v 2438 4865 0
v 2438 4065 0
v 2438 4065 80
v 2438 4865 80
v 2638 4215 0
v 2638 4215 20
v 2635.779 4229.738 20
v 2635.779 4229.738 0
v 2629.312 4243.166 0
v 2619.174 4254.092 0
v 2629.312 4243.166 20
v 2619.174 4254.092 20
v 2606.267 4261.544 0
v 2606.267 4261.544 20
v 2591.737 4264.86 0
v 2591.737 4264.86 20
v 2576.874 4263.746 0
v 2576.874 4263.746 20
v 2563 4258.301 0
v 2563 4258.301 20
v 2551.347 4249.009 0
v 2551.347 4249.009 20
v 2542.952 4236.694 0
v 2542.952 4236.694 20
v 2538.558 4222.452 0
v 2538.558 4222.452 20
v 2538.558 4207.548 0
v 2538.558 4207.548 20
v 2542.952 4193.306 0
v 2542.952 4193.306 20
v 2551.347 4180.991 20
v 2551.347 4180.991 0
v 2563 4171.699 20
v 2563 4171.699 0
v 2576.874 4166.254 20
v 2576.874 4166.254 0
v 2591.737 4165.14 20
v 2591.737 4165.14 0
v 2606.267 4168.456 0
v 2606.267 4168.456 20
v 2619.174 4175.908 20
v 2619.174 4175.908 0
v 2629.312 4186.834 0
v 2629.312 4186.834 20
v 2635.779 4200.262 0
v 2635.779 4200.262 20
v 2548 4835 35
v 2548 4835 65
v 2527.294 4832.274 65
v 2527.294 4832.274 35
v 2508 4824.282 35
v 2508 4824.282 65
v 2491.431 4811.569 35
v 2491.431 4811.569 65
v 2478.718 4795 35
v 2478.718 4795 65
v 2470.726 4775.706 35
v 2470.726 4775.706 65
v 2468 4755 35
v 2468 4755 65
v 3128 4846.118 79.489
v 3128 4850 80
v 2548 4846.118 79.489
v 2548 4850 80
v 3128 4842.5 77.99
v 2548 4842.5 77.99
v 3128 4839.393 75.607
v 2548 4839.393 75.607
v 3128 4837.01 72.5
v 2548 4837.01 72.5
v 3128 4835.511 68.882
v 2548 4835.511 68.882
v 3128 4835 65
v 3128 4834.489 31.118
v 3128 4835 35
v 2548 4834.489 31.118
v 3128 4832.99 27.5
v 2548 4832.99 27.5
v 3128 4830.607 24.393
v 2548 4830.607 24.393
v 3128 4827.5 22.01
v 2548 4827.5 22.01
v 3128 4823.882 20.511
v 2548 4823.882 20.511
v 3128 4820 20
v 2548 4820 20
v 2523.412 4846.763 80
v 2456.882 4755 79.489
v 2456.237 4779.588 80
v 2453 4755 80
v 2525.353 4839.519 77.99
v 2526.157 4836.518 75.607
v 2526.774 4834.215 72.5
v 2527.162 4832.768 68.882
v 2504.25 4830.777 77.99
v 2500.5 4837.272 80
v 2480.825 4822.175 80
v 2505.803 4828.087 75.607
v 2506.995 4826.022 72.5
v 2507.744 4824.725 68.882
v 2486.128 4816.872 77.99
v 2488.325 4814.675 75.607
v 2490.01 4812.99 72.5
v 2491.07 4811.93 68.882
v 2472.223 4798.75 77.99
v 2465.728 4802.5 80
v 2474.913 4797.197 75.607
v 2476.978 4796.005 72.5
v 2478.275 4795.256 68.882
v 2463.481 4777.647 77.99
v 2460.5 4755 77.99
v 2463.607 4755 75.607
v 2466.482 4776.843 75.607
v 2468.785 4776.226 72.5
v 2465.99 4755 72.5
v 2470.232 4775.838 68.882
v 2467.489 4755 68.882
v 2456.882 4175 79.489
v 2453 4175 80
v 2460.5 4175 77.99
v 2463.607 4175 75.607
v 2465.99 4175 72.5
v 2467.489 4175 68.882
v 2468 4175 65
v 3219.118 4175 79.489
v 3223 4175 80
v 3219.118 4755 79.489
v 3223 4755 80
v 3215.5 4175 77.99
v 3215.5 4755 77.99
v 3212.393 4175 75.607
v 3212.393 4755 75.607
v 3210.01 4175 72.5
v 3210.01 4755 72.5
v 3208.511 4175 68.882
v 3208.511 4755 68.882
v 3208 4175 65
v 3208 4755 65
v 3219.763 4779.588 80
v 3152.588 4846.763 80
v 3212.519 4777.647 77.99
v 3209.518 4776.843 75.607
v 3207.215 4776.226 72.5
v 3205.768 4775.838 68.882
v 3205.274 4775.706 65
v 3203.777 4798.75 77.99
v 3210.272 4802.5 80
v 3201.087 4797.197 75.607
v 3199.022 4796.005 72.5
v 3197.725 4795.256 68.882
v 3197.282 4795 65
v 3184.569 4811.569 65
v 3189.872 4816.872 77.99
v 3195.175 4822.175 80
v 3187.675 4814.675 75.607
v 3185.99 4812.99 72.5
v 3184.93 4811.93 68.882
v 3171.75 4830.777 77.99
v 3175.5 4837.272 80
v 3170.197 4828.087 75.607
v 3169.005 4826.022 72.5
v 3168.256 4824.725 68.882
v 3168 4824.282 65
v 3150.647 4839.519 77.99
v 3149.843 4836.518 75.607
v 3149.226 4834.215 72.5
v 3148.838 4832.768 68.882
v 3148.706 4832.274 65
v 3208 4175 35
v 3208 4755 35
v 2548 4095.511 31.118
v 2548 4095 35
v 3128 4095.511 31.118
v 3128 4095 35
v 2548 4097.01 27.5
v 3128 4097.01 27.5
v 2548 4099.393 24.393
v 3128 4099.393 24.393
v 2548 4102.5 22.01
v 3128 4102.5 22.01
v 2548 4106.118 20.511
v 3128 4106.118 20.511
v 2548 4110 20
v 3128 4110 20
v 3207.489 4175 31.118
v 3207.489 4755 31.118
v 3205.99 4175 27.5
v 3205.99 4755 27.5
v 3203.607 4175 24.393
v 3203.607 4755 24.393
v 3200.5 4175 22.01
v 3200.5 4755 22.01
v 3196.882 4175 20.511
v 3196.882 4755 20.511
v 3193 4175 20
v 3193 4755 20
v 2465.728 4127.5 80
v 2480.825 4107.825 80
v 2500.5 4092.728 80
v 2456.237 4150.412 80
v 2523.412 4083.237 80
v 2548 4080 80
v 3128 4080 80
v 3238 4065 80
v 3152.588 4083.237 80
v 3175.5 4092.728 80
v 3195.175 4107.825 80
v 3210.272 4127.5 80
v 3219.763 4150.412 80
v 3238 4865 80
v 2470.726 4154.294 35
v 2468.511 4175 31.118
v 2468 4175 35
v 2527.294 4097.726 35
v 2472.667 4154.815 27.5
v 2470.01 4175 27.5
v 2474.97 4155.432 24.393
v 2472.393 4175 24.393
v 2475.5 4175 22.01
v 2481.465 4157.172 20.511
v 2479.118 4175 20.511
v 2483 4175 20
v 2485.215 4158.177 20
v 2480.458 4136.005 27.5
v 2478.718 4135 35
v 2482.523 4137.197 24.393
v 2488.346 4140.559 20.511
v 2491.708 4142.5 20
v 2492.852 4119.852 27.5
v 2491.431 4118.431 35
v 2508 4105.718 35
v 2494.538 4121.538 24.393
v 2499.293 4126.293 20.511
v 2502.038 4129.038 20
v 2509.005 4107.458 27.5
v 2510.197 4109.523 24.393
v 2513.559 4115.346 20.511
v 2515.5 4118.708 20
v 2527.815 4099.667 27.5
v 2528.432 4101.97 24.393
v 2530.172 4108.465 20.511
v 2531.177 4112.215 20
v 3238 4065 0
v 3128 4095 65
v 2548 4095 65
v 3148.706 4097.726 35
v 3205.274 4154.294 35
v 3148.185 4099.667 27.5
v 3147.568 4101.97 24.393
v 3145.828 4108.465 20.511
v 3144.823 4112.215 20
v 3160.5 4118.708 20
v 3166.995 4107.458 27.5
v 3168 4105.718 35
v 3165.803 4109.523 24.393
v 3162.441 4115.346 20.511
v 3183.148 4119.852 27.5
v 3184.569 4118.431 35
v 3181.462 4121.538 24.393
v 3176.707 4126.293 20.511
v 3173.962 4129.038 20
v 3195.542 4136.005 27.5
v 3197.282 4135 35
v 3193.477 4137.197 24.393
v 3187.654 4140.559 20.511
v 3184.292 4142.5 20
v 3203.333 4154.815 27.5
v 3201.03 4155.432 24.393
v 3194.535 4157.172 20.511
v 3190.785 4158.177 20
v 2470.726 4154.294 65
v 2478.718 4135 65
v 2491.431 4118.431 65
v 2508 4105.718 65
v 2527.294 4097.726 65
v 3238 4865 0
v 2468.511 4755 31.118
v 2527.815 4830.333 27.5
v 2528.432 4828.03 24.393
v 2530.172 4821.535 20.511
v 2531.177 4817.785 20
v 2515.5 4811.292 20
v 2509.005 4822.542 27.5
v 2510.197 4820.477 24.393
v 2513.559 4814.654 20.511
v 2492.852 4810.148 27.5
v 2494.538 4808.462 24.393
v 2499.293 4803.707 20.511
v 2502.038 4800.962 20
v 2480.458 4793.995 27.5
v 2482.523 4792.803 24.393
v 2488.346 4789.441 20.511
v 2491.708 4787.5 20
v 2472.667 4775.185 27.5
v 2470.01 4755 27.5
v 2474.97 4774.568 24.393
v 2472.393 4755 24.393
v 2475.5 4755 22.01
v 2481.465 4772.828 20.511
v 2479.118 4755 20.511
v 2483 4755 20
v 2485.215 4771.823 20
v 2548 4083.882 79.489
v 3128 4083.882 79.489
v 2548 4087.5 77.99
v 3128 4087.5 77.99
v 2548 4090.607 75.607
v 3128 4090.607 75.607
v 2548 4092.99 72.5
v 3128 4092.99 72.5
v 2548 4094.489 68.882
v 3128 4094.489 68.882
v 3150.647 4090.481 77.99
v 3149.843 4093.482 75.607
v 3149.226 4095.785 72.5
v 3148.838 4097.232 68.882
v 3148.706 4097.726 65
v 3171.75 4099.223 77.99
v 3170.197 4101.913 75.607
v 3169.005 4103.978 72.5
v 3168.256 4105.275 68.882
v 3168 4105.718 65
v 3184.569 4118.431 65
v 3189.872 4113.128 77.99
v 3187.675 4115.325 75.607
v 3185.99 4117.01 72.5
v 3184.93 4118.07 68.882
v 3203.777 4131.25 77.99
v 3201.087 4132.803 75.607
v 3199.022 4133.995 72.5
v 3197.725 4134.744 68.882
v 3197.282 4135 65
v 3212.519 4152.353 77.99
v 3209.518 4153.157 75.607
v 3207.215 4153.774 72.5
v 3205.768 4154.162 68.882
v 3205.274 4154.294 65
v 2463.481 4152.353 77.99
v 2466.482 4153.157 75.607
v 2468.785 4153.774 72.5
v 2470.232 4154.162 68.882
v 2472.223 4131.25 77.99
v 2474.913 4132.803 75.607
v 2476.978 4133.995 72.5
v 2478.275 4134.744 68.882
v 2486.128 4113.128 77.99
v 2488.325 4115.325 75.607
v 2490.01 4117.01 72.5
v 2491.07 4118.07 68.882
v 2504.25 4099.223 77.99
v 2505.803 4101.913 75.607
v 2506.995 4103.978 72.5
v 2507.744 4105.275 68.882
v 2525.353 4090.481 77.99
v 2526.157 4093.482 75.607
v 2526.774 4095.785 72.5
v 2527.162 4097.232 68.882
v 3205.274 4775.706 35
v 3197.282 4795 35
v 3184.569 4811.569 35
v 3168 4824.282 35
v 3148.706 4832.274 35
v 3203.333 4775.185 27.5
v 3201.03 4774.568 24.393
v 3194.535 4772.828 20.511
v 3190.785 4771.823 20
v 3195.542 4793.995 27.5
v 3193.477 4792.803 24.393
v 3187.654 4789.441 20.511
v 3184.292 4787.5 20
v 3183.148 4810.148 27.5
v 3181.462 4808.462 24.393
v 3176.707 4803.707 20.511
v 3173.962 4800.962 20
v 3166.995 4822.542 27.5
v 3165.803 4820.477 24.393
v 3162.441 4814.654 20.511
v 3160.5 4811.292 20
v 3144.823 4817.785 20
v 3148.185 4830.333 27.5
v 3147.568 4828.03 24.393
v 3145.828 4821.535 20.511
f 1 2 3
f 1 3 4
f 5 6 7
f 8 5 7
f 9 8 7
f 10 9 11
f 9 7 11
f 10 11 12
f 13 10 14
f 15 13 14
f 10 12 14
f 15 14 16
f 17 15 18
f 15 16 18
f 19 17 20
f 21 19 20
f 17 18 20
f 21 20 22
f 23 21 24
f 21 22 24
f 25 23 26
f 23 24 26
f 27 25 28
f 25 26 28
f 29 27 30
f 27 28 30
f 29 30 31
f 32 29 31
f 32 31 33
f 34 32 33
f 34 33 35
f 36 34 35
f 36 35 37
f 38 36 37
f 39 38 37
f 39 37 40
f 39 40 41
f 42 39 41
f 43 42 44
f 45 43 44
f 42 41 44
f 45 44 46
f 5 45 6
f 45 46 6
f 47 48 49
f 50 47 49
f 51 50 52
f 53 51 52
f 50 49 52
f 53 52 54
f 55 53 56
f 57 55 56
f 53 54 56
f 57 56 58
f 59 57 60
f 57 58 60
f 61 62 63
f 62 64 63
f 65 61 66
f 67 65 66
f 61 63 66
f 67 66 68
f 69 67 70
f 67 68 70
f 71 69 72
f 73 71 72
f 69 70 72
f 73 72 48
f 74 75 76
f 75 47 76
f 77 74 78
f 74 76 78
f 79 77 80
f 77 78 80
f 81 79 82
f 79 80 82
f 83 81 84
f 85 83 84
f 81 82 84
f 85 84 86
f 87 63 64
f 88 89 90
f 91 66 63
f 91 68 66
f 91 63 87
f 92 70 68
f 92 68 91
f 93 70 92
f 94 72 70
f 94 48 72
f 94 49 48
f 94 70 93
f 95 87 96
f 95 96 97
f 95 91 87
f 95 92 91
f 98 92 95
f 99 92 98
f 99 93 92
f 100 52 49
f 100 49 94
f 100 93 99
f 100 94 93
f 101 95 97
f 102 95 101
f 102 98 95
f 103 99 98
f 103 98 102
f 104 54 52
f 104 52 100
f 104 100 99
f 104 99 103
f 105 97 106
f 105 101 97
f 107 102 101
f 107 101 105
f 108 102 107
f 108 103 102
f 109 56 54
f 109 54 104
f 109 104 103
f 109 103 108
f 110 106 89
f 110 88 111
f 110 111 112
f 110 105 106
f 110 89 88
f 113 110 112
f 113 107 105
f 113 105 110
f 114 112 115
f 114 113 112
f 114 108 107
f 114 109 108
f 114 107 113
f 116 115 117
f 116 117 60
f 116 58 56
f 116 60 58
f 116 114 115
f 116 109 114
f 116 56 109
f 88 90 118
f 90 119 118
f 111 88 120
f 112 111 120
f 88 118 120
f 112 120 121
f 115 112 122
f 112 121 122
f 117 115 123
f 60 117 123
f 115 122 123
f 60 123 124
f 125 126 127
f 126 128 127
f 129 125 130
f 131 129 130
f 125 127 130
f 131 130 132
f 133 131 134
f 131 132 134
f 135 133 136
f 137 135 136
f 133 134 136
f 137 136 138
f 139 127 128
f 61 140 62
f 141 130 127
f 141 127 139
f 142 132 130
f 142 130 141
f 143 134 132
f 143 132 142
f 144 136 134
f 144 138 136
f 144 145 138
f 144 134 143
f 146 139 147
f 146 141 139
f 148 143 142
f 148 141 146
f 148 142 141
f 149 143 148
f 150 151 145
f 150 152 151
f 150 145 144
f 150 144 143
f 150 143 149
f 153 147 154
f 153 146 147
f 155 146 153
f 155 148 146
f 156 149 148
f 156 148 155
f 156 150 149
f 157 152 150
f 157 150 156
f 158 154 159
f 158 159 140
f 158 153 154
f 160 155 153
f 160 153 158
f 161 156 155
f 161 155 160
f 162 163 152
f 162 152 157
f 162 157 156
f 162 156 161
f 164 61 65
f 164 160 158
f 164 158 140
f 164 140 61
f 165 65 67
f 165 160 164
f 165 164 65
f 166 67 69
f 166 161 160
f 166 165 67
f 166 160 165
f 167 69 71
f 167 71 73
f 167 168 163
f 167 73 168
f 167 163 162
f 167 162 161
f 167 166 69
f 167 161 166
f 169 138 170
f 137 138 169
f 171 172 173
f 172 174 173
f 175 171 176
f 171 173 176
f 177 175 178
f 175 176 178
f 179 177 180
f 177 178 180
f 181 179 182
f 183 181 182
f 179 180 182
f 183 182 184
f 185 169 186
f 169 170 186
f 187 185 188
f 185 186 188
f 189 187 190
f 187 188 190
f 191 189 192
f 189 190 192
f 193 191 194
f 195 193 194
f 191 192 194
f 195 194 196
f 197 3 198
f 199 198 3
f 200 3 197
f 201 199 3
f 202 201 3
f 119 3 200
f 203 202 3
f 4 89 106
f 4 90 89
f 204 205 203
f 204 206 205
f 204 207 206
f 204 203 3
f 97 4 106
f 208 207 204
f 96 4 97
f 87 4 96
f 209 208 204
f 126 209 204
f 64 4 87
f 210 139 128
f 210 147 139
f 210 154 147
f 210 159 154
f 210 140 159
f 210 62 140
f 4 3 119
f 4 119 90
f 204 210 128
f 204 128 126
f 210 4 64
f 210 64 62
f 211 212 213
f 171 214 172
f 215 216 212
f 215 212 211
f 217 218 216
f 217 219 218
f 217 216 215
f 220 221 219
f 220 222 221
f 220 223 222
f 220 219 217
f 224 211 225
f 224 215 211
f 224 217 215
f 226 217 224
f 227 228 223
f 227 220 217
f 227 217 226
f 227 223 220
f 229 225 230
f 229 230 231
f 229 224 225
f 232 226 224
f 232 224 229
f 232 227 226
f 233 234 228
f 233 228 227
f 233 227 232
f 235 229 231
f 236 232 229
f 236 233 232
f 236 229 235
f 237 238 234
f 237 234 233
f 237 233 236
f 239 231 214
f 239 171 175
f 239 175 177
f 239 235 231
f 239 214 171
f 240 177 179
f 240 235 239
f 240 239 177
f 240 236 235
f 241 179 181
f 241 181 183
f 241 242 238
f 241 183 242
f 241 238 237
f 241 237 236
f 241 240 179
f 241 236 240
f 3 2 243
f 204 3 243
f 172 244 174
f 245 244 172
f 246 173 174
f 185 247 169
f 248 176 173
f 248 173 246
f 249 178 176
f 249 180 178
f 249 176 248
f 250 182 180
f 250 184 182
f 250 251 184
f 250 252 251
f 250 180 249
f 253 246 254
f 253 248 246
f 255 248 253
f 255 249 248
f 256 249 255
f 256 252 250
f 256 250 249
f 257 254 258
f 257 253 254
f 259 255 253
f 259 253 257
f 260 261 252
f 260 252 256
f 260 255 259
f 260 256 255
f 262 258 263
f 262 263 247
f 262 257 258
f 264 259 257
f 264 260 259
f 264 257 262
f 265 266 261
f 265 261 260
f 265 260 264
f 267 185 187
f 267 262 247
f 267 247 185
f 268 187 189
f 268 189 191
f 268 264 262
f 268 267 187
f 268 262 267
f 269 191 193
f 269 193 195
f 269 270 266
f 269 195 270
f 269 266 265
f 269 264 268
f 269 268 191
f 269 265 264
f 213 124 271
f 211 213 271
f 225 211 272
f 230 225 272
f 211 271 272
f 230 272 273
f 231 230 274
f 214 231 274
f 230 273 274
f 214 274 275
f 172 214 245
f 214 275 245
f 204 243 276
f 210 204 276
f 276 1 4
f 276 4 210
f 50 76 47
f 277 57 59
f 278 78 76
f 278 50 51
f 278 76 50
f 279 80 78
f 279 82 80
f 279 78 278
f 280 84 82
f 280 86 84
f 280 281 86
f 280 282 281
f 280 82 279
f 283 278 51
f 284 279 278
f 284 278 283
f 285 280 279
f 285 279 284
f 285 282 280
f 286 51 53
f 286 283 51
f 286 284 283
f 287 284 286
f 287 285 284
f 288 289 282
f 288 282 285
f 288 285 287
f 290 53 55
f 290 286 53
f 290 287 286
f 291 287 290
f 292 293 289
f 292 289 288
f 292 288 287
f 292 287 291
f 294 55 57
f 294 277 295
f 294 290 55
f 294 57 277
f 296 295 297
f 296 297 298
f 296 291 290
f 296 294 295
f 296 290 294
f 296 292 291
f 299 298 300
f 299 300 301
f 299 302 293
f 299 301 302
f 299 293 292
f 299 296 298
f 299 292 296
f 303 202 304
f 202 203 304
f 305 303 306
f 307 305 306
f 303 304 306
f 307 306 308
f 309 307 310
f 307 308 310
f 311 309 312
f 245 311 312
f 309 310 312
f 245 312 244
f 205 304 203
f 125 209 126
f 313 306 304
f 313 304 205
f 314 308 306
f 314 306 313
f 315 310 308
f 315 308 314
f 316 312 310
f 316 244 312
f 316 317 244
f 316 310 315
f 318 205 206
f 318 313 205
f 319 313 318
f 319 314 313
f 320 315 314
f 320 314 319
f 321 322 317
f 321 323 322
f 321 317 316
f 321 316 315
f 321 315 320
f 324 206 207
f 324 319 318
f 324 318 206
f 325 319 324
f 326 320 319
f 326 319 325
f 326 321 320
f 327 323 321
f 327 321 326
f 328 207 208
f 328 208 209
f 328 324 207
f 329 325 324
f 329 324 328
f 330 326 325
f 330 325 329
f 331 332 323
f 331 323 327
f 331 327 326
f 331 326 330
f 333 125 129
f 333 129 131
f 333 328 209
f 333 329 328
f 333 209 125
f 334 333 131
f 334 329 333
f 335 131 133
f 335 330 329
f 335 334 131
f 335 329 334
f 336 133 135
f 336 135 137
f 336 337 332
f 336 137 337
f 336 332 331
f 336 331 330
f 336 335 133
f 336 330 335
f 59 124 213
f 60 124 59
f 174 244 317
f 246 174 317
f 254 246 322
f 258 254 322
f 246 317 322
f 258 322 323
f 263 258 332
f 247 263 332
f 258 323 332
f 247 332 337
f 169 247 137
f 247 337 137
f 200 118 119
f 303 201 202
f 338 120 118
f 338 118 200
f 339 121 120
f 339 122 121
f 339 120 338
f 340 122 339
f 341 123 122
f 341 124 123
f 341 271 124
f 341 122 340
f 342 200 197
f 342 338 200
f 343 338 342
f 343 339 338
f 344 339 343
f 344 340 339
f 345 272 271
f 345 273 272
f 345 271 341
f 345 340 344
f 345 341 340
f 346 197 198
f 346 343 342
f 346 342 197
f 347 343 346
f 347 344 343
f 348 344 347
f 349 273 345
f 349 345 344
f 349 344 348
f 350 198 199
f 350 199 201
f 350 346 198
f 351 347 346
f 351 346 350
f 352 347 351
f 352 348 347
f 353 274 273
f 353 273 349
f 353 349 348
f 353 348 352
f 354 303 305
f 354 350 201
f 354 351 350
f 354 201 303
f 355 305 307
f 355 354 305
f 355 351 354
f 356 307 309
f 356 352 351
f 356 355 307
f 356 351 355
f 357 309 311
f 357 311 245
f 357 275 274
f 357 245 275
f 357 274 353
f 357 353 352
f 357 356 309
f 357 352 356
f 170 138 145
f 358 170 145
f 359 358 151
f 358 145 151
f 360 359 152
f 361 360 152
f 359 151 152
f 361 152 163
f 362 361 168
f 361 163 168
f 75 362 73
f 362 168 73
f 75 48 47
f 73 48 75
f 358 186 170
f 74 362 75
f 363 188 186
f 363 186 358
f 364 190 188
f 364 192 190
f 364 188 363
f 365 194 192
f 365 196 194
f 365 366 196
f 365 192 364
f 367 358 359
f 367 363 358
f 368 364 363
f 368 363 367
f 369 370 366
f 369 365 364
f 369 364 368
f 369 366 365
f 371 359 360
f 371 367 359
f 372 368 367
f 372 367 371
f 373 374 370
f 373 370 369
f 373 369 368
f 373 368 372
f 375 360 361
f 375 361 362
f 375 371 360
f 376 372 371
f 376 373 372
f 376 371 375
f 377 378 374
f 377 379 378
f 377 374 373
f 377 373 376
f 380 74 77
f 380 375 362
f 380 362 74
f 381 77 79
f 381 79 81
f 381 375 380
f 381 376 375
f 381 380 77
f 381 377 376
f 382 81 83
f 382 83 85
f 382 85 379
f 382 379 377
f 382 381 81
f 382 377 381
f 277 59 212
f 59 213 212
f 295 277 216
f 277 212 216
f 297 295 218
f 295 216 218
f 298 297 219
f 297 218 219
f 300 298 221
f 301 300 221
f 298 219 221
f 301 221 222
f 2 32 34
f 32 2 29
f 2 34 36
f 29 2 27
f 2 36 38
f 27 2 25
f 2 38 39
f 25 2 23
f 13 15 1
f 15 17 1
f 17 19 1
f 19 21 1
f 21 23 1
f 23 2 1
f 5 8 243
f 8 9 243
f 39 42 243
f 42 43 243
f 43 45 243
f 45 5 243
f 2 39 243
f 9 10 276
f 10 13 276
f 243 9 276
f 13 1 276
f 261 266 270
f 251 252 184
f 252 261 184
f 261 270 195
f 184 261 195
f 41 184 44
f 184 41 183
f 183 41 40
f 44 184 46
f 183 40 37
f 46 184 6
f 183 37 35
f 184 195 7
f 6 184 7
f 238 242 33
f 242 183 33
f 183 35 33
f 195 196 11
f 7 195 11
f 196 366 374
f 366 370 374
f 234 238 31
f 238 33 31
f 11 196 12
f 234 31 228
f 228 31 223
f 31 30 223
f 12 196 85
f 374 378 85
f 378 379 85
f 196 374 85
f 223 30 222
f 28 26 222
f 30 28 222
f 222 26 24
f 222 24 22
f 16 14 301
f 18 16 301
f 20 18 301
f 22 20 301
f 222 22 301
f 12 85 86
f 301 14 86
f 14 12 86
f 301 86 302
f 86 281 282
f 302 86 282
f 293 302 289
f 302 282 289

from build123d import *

# Parameters (mm, degrees)
SKETCH196_W     = 800
SKETCH196_H     = 800
PAD016_DEPTH    = 80
POCKET_DEPTH    = 60
SKETCH198_R     = 50
POCKET001_DEPTH = 20
FILLET016_R     = 15
FILLET017_R     = 15


with BuildPart() as part:
    # Sketch196 → Pad016 (new body)
    with BuildSketch(Plane.XY):
        with Locations((400, 400)):
            Rectangle(SKETCH196_W, SKETCH196_H)
    extrude(amount=PAD016_DEPTH)

    # Sketch197 (on Face6 of Pad016) → Pocket (cut)
    with BuildSketch(Plane.XY.offset(80)):
        with BuildLine():
            Line((30, 110), (30, 690))
            ThreePointArc((110, 770), (53.431458, 746.568542), (30, 690))
            Line((110, 770), (690, 770))
            ThreePointArc((770, 690), (746.568542, 746.568542), (690, 770))
            Line((770, 690), (770, 110))
            ThreePointArc((690, 30), (746.568542, 53.431458), (770, 110))
            Line((690, 30), (110, 30))
            ThreePointArc((30, 110), (53.431458, 53.431458), (110, 30))
        make_face()
    extrude(amount=-POCKET_DEPTH, mode=Mode.SUBTRACT)

    # Sketch198 (on Face15 of Pocket) → Pocket001 (cut)
    with BuildSketch(Plane.XY.offset(20)):
        with Locations((150, 150)):
            Circle(SKETCH198_R)
    extrude(amount=-POCKET001_DEPTH, mode=Mode.SUBTRACT)

    # Fillet016
    fillet016_edges = [part.edges().sort_by_distance(p)[0] for p in [
        (53.431458, 746.568542, 20),
        (30, 400, 20),
        (53.431458, 53.431458, 20),
        (400, 30, 20),
        (746.568542, 53.431458, 20),
        (770, 400, 20),
        (746.568542, 746.568542, 20),
        (400, 770, 20),
    ]]
    fillet(fillet016_edges, radius=FILLET016_R)

    # Fillet017
    fillet017_edges = [part.edges().sort_by_distance(p)[0] for p in [
        (53.431458, 746.568542, 80),
        (30, 400, 80),
        (53.431458, 53.431458, 80),
        (746.568542, 53.431458, 80),
        (770, 400, 80),
        (746.568542, 746.568542, 80),
        (400, 770, 80),
    ]]
    fillet(fillet017_edges, radius=FILLET017_R)


with BuildPart() as part_1:
    # Body011 placement: moved
    add(part.part.moved(Location((2438, 4065, 0))))


solid = part_1.part
